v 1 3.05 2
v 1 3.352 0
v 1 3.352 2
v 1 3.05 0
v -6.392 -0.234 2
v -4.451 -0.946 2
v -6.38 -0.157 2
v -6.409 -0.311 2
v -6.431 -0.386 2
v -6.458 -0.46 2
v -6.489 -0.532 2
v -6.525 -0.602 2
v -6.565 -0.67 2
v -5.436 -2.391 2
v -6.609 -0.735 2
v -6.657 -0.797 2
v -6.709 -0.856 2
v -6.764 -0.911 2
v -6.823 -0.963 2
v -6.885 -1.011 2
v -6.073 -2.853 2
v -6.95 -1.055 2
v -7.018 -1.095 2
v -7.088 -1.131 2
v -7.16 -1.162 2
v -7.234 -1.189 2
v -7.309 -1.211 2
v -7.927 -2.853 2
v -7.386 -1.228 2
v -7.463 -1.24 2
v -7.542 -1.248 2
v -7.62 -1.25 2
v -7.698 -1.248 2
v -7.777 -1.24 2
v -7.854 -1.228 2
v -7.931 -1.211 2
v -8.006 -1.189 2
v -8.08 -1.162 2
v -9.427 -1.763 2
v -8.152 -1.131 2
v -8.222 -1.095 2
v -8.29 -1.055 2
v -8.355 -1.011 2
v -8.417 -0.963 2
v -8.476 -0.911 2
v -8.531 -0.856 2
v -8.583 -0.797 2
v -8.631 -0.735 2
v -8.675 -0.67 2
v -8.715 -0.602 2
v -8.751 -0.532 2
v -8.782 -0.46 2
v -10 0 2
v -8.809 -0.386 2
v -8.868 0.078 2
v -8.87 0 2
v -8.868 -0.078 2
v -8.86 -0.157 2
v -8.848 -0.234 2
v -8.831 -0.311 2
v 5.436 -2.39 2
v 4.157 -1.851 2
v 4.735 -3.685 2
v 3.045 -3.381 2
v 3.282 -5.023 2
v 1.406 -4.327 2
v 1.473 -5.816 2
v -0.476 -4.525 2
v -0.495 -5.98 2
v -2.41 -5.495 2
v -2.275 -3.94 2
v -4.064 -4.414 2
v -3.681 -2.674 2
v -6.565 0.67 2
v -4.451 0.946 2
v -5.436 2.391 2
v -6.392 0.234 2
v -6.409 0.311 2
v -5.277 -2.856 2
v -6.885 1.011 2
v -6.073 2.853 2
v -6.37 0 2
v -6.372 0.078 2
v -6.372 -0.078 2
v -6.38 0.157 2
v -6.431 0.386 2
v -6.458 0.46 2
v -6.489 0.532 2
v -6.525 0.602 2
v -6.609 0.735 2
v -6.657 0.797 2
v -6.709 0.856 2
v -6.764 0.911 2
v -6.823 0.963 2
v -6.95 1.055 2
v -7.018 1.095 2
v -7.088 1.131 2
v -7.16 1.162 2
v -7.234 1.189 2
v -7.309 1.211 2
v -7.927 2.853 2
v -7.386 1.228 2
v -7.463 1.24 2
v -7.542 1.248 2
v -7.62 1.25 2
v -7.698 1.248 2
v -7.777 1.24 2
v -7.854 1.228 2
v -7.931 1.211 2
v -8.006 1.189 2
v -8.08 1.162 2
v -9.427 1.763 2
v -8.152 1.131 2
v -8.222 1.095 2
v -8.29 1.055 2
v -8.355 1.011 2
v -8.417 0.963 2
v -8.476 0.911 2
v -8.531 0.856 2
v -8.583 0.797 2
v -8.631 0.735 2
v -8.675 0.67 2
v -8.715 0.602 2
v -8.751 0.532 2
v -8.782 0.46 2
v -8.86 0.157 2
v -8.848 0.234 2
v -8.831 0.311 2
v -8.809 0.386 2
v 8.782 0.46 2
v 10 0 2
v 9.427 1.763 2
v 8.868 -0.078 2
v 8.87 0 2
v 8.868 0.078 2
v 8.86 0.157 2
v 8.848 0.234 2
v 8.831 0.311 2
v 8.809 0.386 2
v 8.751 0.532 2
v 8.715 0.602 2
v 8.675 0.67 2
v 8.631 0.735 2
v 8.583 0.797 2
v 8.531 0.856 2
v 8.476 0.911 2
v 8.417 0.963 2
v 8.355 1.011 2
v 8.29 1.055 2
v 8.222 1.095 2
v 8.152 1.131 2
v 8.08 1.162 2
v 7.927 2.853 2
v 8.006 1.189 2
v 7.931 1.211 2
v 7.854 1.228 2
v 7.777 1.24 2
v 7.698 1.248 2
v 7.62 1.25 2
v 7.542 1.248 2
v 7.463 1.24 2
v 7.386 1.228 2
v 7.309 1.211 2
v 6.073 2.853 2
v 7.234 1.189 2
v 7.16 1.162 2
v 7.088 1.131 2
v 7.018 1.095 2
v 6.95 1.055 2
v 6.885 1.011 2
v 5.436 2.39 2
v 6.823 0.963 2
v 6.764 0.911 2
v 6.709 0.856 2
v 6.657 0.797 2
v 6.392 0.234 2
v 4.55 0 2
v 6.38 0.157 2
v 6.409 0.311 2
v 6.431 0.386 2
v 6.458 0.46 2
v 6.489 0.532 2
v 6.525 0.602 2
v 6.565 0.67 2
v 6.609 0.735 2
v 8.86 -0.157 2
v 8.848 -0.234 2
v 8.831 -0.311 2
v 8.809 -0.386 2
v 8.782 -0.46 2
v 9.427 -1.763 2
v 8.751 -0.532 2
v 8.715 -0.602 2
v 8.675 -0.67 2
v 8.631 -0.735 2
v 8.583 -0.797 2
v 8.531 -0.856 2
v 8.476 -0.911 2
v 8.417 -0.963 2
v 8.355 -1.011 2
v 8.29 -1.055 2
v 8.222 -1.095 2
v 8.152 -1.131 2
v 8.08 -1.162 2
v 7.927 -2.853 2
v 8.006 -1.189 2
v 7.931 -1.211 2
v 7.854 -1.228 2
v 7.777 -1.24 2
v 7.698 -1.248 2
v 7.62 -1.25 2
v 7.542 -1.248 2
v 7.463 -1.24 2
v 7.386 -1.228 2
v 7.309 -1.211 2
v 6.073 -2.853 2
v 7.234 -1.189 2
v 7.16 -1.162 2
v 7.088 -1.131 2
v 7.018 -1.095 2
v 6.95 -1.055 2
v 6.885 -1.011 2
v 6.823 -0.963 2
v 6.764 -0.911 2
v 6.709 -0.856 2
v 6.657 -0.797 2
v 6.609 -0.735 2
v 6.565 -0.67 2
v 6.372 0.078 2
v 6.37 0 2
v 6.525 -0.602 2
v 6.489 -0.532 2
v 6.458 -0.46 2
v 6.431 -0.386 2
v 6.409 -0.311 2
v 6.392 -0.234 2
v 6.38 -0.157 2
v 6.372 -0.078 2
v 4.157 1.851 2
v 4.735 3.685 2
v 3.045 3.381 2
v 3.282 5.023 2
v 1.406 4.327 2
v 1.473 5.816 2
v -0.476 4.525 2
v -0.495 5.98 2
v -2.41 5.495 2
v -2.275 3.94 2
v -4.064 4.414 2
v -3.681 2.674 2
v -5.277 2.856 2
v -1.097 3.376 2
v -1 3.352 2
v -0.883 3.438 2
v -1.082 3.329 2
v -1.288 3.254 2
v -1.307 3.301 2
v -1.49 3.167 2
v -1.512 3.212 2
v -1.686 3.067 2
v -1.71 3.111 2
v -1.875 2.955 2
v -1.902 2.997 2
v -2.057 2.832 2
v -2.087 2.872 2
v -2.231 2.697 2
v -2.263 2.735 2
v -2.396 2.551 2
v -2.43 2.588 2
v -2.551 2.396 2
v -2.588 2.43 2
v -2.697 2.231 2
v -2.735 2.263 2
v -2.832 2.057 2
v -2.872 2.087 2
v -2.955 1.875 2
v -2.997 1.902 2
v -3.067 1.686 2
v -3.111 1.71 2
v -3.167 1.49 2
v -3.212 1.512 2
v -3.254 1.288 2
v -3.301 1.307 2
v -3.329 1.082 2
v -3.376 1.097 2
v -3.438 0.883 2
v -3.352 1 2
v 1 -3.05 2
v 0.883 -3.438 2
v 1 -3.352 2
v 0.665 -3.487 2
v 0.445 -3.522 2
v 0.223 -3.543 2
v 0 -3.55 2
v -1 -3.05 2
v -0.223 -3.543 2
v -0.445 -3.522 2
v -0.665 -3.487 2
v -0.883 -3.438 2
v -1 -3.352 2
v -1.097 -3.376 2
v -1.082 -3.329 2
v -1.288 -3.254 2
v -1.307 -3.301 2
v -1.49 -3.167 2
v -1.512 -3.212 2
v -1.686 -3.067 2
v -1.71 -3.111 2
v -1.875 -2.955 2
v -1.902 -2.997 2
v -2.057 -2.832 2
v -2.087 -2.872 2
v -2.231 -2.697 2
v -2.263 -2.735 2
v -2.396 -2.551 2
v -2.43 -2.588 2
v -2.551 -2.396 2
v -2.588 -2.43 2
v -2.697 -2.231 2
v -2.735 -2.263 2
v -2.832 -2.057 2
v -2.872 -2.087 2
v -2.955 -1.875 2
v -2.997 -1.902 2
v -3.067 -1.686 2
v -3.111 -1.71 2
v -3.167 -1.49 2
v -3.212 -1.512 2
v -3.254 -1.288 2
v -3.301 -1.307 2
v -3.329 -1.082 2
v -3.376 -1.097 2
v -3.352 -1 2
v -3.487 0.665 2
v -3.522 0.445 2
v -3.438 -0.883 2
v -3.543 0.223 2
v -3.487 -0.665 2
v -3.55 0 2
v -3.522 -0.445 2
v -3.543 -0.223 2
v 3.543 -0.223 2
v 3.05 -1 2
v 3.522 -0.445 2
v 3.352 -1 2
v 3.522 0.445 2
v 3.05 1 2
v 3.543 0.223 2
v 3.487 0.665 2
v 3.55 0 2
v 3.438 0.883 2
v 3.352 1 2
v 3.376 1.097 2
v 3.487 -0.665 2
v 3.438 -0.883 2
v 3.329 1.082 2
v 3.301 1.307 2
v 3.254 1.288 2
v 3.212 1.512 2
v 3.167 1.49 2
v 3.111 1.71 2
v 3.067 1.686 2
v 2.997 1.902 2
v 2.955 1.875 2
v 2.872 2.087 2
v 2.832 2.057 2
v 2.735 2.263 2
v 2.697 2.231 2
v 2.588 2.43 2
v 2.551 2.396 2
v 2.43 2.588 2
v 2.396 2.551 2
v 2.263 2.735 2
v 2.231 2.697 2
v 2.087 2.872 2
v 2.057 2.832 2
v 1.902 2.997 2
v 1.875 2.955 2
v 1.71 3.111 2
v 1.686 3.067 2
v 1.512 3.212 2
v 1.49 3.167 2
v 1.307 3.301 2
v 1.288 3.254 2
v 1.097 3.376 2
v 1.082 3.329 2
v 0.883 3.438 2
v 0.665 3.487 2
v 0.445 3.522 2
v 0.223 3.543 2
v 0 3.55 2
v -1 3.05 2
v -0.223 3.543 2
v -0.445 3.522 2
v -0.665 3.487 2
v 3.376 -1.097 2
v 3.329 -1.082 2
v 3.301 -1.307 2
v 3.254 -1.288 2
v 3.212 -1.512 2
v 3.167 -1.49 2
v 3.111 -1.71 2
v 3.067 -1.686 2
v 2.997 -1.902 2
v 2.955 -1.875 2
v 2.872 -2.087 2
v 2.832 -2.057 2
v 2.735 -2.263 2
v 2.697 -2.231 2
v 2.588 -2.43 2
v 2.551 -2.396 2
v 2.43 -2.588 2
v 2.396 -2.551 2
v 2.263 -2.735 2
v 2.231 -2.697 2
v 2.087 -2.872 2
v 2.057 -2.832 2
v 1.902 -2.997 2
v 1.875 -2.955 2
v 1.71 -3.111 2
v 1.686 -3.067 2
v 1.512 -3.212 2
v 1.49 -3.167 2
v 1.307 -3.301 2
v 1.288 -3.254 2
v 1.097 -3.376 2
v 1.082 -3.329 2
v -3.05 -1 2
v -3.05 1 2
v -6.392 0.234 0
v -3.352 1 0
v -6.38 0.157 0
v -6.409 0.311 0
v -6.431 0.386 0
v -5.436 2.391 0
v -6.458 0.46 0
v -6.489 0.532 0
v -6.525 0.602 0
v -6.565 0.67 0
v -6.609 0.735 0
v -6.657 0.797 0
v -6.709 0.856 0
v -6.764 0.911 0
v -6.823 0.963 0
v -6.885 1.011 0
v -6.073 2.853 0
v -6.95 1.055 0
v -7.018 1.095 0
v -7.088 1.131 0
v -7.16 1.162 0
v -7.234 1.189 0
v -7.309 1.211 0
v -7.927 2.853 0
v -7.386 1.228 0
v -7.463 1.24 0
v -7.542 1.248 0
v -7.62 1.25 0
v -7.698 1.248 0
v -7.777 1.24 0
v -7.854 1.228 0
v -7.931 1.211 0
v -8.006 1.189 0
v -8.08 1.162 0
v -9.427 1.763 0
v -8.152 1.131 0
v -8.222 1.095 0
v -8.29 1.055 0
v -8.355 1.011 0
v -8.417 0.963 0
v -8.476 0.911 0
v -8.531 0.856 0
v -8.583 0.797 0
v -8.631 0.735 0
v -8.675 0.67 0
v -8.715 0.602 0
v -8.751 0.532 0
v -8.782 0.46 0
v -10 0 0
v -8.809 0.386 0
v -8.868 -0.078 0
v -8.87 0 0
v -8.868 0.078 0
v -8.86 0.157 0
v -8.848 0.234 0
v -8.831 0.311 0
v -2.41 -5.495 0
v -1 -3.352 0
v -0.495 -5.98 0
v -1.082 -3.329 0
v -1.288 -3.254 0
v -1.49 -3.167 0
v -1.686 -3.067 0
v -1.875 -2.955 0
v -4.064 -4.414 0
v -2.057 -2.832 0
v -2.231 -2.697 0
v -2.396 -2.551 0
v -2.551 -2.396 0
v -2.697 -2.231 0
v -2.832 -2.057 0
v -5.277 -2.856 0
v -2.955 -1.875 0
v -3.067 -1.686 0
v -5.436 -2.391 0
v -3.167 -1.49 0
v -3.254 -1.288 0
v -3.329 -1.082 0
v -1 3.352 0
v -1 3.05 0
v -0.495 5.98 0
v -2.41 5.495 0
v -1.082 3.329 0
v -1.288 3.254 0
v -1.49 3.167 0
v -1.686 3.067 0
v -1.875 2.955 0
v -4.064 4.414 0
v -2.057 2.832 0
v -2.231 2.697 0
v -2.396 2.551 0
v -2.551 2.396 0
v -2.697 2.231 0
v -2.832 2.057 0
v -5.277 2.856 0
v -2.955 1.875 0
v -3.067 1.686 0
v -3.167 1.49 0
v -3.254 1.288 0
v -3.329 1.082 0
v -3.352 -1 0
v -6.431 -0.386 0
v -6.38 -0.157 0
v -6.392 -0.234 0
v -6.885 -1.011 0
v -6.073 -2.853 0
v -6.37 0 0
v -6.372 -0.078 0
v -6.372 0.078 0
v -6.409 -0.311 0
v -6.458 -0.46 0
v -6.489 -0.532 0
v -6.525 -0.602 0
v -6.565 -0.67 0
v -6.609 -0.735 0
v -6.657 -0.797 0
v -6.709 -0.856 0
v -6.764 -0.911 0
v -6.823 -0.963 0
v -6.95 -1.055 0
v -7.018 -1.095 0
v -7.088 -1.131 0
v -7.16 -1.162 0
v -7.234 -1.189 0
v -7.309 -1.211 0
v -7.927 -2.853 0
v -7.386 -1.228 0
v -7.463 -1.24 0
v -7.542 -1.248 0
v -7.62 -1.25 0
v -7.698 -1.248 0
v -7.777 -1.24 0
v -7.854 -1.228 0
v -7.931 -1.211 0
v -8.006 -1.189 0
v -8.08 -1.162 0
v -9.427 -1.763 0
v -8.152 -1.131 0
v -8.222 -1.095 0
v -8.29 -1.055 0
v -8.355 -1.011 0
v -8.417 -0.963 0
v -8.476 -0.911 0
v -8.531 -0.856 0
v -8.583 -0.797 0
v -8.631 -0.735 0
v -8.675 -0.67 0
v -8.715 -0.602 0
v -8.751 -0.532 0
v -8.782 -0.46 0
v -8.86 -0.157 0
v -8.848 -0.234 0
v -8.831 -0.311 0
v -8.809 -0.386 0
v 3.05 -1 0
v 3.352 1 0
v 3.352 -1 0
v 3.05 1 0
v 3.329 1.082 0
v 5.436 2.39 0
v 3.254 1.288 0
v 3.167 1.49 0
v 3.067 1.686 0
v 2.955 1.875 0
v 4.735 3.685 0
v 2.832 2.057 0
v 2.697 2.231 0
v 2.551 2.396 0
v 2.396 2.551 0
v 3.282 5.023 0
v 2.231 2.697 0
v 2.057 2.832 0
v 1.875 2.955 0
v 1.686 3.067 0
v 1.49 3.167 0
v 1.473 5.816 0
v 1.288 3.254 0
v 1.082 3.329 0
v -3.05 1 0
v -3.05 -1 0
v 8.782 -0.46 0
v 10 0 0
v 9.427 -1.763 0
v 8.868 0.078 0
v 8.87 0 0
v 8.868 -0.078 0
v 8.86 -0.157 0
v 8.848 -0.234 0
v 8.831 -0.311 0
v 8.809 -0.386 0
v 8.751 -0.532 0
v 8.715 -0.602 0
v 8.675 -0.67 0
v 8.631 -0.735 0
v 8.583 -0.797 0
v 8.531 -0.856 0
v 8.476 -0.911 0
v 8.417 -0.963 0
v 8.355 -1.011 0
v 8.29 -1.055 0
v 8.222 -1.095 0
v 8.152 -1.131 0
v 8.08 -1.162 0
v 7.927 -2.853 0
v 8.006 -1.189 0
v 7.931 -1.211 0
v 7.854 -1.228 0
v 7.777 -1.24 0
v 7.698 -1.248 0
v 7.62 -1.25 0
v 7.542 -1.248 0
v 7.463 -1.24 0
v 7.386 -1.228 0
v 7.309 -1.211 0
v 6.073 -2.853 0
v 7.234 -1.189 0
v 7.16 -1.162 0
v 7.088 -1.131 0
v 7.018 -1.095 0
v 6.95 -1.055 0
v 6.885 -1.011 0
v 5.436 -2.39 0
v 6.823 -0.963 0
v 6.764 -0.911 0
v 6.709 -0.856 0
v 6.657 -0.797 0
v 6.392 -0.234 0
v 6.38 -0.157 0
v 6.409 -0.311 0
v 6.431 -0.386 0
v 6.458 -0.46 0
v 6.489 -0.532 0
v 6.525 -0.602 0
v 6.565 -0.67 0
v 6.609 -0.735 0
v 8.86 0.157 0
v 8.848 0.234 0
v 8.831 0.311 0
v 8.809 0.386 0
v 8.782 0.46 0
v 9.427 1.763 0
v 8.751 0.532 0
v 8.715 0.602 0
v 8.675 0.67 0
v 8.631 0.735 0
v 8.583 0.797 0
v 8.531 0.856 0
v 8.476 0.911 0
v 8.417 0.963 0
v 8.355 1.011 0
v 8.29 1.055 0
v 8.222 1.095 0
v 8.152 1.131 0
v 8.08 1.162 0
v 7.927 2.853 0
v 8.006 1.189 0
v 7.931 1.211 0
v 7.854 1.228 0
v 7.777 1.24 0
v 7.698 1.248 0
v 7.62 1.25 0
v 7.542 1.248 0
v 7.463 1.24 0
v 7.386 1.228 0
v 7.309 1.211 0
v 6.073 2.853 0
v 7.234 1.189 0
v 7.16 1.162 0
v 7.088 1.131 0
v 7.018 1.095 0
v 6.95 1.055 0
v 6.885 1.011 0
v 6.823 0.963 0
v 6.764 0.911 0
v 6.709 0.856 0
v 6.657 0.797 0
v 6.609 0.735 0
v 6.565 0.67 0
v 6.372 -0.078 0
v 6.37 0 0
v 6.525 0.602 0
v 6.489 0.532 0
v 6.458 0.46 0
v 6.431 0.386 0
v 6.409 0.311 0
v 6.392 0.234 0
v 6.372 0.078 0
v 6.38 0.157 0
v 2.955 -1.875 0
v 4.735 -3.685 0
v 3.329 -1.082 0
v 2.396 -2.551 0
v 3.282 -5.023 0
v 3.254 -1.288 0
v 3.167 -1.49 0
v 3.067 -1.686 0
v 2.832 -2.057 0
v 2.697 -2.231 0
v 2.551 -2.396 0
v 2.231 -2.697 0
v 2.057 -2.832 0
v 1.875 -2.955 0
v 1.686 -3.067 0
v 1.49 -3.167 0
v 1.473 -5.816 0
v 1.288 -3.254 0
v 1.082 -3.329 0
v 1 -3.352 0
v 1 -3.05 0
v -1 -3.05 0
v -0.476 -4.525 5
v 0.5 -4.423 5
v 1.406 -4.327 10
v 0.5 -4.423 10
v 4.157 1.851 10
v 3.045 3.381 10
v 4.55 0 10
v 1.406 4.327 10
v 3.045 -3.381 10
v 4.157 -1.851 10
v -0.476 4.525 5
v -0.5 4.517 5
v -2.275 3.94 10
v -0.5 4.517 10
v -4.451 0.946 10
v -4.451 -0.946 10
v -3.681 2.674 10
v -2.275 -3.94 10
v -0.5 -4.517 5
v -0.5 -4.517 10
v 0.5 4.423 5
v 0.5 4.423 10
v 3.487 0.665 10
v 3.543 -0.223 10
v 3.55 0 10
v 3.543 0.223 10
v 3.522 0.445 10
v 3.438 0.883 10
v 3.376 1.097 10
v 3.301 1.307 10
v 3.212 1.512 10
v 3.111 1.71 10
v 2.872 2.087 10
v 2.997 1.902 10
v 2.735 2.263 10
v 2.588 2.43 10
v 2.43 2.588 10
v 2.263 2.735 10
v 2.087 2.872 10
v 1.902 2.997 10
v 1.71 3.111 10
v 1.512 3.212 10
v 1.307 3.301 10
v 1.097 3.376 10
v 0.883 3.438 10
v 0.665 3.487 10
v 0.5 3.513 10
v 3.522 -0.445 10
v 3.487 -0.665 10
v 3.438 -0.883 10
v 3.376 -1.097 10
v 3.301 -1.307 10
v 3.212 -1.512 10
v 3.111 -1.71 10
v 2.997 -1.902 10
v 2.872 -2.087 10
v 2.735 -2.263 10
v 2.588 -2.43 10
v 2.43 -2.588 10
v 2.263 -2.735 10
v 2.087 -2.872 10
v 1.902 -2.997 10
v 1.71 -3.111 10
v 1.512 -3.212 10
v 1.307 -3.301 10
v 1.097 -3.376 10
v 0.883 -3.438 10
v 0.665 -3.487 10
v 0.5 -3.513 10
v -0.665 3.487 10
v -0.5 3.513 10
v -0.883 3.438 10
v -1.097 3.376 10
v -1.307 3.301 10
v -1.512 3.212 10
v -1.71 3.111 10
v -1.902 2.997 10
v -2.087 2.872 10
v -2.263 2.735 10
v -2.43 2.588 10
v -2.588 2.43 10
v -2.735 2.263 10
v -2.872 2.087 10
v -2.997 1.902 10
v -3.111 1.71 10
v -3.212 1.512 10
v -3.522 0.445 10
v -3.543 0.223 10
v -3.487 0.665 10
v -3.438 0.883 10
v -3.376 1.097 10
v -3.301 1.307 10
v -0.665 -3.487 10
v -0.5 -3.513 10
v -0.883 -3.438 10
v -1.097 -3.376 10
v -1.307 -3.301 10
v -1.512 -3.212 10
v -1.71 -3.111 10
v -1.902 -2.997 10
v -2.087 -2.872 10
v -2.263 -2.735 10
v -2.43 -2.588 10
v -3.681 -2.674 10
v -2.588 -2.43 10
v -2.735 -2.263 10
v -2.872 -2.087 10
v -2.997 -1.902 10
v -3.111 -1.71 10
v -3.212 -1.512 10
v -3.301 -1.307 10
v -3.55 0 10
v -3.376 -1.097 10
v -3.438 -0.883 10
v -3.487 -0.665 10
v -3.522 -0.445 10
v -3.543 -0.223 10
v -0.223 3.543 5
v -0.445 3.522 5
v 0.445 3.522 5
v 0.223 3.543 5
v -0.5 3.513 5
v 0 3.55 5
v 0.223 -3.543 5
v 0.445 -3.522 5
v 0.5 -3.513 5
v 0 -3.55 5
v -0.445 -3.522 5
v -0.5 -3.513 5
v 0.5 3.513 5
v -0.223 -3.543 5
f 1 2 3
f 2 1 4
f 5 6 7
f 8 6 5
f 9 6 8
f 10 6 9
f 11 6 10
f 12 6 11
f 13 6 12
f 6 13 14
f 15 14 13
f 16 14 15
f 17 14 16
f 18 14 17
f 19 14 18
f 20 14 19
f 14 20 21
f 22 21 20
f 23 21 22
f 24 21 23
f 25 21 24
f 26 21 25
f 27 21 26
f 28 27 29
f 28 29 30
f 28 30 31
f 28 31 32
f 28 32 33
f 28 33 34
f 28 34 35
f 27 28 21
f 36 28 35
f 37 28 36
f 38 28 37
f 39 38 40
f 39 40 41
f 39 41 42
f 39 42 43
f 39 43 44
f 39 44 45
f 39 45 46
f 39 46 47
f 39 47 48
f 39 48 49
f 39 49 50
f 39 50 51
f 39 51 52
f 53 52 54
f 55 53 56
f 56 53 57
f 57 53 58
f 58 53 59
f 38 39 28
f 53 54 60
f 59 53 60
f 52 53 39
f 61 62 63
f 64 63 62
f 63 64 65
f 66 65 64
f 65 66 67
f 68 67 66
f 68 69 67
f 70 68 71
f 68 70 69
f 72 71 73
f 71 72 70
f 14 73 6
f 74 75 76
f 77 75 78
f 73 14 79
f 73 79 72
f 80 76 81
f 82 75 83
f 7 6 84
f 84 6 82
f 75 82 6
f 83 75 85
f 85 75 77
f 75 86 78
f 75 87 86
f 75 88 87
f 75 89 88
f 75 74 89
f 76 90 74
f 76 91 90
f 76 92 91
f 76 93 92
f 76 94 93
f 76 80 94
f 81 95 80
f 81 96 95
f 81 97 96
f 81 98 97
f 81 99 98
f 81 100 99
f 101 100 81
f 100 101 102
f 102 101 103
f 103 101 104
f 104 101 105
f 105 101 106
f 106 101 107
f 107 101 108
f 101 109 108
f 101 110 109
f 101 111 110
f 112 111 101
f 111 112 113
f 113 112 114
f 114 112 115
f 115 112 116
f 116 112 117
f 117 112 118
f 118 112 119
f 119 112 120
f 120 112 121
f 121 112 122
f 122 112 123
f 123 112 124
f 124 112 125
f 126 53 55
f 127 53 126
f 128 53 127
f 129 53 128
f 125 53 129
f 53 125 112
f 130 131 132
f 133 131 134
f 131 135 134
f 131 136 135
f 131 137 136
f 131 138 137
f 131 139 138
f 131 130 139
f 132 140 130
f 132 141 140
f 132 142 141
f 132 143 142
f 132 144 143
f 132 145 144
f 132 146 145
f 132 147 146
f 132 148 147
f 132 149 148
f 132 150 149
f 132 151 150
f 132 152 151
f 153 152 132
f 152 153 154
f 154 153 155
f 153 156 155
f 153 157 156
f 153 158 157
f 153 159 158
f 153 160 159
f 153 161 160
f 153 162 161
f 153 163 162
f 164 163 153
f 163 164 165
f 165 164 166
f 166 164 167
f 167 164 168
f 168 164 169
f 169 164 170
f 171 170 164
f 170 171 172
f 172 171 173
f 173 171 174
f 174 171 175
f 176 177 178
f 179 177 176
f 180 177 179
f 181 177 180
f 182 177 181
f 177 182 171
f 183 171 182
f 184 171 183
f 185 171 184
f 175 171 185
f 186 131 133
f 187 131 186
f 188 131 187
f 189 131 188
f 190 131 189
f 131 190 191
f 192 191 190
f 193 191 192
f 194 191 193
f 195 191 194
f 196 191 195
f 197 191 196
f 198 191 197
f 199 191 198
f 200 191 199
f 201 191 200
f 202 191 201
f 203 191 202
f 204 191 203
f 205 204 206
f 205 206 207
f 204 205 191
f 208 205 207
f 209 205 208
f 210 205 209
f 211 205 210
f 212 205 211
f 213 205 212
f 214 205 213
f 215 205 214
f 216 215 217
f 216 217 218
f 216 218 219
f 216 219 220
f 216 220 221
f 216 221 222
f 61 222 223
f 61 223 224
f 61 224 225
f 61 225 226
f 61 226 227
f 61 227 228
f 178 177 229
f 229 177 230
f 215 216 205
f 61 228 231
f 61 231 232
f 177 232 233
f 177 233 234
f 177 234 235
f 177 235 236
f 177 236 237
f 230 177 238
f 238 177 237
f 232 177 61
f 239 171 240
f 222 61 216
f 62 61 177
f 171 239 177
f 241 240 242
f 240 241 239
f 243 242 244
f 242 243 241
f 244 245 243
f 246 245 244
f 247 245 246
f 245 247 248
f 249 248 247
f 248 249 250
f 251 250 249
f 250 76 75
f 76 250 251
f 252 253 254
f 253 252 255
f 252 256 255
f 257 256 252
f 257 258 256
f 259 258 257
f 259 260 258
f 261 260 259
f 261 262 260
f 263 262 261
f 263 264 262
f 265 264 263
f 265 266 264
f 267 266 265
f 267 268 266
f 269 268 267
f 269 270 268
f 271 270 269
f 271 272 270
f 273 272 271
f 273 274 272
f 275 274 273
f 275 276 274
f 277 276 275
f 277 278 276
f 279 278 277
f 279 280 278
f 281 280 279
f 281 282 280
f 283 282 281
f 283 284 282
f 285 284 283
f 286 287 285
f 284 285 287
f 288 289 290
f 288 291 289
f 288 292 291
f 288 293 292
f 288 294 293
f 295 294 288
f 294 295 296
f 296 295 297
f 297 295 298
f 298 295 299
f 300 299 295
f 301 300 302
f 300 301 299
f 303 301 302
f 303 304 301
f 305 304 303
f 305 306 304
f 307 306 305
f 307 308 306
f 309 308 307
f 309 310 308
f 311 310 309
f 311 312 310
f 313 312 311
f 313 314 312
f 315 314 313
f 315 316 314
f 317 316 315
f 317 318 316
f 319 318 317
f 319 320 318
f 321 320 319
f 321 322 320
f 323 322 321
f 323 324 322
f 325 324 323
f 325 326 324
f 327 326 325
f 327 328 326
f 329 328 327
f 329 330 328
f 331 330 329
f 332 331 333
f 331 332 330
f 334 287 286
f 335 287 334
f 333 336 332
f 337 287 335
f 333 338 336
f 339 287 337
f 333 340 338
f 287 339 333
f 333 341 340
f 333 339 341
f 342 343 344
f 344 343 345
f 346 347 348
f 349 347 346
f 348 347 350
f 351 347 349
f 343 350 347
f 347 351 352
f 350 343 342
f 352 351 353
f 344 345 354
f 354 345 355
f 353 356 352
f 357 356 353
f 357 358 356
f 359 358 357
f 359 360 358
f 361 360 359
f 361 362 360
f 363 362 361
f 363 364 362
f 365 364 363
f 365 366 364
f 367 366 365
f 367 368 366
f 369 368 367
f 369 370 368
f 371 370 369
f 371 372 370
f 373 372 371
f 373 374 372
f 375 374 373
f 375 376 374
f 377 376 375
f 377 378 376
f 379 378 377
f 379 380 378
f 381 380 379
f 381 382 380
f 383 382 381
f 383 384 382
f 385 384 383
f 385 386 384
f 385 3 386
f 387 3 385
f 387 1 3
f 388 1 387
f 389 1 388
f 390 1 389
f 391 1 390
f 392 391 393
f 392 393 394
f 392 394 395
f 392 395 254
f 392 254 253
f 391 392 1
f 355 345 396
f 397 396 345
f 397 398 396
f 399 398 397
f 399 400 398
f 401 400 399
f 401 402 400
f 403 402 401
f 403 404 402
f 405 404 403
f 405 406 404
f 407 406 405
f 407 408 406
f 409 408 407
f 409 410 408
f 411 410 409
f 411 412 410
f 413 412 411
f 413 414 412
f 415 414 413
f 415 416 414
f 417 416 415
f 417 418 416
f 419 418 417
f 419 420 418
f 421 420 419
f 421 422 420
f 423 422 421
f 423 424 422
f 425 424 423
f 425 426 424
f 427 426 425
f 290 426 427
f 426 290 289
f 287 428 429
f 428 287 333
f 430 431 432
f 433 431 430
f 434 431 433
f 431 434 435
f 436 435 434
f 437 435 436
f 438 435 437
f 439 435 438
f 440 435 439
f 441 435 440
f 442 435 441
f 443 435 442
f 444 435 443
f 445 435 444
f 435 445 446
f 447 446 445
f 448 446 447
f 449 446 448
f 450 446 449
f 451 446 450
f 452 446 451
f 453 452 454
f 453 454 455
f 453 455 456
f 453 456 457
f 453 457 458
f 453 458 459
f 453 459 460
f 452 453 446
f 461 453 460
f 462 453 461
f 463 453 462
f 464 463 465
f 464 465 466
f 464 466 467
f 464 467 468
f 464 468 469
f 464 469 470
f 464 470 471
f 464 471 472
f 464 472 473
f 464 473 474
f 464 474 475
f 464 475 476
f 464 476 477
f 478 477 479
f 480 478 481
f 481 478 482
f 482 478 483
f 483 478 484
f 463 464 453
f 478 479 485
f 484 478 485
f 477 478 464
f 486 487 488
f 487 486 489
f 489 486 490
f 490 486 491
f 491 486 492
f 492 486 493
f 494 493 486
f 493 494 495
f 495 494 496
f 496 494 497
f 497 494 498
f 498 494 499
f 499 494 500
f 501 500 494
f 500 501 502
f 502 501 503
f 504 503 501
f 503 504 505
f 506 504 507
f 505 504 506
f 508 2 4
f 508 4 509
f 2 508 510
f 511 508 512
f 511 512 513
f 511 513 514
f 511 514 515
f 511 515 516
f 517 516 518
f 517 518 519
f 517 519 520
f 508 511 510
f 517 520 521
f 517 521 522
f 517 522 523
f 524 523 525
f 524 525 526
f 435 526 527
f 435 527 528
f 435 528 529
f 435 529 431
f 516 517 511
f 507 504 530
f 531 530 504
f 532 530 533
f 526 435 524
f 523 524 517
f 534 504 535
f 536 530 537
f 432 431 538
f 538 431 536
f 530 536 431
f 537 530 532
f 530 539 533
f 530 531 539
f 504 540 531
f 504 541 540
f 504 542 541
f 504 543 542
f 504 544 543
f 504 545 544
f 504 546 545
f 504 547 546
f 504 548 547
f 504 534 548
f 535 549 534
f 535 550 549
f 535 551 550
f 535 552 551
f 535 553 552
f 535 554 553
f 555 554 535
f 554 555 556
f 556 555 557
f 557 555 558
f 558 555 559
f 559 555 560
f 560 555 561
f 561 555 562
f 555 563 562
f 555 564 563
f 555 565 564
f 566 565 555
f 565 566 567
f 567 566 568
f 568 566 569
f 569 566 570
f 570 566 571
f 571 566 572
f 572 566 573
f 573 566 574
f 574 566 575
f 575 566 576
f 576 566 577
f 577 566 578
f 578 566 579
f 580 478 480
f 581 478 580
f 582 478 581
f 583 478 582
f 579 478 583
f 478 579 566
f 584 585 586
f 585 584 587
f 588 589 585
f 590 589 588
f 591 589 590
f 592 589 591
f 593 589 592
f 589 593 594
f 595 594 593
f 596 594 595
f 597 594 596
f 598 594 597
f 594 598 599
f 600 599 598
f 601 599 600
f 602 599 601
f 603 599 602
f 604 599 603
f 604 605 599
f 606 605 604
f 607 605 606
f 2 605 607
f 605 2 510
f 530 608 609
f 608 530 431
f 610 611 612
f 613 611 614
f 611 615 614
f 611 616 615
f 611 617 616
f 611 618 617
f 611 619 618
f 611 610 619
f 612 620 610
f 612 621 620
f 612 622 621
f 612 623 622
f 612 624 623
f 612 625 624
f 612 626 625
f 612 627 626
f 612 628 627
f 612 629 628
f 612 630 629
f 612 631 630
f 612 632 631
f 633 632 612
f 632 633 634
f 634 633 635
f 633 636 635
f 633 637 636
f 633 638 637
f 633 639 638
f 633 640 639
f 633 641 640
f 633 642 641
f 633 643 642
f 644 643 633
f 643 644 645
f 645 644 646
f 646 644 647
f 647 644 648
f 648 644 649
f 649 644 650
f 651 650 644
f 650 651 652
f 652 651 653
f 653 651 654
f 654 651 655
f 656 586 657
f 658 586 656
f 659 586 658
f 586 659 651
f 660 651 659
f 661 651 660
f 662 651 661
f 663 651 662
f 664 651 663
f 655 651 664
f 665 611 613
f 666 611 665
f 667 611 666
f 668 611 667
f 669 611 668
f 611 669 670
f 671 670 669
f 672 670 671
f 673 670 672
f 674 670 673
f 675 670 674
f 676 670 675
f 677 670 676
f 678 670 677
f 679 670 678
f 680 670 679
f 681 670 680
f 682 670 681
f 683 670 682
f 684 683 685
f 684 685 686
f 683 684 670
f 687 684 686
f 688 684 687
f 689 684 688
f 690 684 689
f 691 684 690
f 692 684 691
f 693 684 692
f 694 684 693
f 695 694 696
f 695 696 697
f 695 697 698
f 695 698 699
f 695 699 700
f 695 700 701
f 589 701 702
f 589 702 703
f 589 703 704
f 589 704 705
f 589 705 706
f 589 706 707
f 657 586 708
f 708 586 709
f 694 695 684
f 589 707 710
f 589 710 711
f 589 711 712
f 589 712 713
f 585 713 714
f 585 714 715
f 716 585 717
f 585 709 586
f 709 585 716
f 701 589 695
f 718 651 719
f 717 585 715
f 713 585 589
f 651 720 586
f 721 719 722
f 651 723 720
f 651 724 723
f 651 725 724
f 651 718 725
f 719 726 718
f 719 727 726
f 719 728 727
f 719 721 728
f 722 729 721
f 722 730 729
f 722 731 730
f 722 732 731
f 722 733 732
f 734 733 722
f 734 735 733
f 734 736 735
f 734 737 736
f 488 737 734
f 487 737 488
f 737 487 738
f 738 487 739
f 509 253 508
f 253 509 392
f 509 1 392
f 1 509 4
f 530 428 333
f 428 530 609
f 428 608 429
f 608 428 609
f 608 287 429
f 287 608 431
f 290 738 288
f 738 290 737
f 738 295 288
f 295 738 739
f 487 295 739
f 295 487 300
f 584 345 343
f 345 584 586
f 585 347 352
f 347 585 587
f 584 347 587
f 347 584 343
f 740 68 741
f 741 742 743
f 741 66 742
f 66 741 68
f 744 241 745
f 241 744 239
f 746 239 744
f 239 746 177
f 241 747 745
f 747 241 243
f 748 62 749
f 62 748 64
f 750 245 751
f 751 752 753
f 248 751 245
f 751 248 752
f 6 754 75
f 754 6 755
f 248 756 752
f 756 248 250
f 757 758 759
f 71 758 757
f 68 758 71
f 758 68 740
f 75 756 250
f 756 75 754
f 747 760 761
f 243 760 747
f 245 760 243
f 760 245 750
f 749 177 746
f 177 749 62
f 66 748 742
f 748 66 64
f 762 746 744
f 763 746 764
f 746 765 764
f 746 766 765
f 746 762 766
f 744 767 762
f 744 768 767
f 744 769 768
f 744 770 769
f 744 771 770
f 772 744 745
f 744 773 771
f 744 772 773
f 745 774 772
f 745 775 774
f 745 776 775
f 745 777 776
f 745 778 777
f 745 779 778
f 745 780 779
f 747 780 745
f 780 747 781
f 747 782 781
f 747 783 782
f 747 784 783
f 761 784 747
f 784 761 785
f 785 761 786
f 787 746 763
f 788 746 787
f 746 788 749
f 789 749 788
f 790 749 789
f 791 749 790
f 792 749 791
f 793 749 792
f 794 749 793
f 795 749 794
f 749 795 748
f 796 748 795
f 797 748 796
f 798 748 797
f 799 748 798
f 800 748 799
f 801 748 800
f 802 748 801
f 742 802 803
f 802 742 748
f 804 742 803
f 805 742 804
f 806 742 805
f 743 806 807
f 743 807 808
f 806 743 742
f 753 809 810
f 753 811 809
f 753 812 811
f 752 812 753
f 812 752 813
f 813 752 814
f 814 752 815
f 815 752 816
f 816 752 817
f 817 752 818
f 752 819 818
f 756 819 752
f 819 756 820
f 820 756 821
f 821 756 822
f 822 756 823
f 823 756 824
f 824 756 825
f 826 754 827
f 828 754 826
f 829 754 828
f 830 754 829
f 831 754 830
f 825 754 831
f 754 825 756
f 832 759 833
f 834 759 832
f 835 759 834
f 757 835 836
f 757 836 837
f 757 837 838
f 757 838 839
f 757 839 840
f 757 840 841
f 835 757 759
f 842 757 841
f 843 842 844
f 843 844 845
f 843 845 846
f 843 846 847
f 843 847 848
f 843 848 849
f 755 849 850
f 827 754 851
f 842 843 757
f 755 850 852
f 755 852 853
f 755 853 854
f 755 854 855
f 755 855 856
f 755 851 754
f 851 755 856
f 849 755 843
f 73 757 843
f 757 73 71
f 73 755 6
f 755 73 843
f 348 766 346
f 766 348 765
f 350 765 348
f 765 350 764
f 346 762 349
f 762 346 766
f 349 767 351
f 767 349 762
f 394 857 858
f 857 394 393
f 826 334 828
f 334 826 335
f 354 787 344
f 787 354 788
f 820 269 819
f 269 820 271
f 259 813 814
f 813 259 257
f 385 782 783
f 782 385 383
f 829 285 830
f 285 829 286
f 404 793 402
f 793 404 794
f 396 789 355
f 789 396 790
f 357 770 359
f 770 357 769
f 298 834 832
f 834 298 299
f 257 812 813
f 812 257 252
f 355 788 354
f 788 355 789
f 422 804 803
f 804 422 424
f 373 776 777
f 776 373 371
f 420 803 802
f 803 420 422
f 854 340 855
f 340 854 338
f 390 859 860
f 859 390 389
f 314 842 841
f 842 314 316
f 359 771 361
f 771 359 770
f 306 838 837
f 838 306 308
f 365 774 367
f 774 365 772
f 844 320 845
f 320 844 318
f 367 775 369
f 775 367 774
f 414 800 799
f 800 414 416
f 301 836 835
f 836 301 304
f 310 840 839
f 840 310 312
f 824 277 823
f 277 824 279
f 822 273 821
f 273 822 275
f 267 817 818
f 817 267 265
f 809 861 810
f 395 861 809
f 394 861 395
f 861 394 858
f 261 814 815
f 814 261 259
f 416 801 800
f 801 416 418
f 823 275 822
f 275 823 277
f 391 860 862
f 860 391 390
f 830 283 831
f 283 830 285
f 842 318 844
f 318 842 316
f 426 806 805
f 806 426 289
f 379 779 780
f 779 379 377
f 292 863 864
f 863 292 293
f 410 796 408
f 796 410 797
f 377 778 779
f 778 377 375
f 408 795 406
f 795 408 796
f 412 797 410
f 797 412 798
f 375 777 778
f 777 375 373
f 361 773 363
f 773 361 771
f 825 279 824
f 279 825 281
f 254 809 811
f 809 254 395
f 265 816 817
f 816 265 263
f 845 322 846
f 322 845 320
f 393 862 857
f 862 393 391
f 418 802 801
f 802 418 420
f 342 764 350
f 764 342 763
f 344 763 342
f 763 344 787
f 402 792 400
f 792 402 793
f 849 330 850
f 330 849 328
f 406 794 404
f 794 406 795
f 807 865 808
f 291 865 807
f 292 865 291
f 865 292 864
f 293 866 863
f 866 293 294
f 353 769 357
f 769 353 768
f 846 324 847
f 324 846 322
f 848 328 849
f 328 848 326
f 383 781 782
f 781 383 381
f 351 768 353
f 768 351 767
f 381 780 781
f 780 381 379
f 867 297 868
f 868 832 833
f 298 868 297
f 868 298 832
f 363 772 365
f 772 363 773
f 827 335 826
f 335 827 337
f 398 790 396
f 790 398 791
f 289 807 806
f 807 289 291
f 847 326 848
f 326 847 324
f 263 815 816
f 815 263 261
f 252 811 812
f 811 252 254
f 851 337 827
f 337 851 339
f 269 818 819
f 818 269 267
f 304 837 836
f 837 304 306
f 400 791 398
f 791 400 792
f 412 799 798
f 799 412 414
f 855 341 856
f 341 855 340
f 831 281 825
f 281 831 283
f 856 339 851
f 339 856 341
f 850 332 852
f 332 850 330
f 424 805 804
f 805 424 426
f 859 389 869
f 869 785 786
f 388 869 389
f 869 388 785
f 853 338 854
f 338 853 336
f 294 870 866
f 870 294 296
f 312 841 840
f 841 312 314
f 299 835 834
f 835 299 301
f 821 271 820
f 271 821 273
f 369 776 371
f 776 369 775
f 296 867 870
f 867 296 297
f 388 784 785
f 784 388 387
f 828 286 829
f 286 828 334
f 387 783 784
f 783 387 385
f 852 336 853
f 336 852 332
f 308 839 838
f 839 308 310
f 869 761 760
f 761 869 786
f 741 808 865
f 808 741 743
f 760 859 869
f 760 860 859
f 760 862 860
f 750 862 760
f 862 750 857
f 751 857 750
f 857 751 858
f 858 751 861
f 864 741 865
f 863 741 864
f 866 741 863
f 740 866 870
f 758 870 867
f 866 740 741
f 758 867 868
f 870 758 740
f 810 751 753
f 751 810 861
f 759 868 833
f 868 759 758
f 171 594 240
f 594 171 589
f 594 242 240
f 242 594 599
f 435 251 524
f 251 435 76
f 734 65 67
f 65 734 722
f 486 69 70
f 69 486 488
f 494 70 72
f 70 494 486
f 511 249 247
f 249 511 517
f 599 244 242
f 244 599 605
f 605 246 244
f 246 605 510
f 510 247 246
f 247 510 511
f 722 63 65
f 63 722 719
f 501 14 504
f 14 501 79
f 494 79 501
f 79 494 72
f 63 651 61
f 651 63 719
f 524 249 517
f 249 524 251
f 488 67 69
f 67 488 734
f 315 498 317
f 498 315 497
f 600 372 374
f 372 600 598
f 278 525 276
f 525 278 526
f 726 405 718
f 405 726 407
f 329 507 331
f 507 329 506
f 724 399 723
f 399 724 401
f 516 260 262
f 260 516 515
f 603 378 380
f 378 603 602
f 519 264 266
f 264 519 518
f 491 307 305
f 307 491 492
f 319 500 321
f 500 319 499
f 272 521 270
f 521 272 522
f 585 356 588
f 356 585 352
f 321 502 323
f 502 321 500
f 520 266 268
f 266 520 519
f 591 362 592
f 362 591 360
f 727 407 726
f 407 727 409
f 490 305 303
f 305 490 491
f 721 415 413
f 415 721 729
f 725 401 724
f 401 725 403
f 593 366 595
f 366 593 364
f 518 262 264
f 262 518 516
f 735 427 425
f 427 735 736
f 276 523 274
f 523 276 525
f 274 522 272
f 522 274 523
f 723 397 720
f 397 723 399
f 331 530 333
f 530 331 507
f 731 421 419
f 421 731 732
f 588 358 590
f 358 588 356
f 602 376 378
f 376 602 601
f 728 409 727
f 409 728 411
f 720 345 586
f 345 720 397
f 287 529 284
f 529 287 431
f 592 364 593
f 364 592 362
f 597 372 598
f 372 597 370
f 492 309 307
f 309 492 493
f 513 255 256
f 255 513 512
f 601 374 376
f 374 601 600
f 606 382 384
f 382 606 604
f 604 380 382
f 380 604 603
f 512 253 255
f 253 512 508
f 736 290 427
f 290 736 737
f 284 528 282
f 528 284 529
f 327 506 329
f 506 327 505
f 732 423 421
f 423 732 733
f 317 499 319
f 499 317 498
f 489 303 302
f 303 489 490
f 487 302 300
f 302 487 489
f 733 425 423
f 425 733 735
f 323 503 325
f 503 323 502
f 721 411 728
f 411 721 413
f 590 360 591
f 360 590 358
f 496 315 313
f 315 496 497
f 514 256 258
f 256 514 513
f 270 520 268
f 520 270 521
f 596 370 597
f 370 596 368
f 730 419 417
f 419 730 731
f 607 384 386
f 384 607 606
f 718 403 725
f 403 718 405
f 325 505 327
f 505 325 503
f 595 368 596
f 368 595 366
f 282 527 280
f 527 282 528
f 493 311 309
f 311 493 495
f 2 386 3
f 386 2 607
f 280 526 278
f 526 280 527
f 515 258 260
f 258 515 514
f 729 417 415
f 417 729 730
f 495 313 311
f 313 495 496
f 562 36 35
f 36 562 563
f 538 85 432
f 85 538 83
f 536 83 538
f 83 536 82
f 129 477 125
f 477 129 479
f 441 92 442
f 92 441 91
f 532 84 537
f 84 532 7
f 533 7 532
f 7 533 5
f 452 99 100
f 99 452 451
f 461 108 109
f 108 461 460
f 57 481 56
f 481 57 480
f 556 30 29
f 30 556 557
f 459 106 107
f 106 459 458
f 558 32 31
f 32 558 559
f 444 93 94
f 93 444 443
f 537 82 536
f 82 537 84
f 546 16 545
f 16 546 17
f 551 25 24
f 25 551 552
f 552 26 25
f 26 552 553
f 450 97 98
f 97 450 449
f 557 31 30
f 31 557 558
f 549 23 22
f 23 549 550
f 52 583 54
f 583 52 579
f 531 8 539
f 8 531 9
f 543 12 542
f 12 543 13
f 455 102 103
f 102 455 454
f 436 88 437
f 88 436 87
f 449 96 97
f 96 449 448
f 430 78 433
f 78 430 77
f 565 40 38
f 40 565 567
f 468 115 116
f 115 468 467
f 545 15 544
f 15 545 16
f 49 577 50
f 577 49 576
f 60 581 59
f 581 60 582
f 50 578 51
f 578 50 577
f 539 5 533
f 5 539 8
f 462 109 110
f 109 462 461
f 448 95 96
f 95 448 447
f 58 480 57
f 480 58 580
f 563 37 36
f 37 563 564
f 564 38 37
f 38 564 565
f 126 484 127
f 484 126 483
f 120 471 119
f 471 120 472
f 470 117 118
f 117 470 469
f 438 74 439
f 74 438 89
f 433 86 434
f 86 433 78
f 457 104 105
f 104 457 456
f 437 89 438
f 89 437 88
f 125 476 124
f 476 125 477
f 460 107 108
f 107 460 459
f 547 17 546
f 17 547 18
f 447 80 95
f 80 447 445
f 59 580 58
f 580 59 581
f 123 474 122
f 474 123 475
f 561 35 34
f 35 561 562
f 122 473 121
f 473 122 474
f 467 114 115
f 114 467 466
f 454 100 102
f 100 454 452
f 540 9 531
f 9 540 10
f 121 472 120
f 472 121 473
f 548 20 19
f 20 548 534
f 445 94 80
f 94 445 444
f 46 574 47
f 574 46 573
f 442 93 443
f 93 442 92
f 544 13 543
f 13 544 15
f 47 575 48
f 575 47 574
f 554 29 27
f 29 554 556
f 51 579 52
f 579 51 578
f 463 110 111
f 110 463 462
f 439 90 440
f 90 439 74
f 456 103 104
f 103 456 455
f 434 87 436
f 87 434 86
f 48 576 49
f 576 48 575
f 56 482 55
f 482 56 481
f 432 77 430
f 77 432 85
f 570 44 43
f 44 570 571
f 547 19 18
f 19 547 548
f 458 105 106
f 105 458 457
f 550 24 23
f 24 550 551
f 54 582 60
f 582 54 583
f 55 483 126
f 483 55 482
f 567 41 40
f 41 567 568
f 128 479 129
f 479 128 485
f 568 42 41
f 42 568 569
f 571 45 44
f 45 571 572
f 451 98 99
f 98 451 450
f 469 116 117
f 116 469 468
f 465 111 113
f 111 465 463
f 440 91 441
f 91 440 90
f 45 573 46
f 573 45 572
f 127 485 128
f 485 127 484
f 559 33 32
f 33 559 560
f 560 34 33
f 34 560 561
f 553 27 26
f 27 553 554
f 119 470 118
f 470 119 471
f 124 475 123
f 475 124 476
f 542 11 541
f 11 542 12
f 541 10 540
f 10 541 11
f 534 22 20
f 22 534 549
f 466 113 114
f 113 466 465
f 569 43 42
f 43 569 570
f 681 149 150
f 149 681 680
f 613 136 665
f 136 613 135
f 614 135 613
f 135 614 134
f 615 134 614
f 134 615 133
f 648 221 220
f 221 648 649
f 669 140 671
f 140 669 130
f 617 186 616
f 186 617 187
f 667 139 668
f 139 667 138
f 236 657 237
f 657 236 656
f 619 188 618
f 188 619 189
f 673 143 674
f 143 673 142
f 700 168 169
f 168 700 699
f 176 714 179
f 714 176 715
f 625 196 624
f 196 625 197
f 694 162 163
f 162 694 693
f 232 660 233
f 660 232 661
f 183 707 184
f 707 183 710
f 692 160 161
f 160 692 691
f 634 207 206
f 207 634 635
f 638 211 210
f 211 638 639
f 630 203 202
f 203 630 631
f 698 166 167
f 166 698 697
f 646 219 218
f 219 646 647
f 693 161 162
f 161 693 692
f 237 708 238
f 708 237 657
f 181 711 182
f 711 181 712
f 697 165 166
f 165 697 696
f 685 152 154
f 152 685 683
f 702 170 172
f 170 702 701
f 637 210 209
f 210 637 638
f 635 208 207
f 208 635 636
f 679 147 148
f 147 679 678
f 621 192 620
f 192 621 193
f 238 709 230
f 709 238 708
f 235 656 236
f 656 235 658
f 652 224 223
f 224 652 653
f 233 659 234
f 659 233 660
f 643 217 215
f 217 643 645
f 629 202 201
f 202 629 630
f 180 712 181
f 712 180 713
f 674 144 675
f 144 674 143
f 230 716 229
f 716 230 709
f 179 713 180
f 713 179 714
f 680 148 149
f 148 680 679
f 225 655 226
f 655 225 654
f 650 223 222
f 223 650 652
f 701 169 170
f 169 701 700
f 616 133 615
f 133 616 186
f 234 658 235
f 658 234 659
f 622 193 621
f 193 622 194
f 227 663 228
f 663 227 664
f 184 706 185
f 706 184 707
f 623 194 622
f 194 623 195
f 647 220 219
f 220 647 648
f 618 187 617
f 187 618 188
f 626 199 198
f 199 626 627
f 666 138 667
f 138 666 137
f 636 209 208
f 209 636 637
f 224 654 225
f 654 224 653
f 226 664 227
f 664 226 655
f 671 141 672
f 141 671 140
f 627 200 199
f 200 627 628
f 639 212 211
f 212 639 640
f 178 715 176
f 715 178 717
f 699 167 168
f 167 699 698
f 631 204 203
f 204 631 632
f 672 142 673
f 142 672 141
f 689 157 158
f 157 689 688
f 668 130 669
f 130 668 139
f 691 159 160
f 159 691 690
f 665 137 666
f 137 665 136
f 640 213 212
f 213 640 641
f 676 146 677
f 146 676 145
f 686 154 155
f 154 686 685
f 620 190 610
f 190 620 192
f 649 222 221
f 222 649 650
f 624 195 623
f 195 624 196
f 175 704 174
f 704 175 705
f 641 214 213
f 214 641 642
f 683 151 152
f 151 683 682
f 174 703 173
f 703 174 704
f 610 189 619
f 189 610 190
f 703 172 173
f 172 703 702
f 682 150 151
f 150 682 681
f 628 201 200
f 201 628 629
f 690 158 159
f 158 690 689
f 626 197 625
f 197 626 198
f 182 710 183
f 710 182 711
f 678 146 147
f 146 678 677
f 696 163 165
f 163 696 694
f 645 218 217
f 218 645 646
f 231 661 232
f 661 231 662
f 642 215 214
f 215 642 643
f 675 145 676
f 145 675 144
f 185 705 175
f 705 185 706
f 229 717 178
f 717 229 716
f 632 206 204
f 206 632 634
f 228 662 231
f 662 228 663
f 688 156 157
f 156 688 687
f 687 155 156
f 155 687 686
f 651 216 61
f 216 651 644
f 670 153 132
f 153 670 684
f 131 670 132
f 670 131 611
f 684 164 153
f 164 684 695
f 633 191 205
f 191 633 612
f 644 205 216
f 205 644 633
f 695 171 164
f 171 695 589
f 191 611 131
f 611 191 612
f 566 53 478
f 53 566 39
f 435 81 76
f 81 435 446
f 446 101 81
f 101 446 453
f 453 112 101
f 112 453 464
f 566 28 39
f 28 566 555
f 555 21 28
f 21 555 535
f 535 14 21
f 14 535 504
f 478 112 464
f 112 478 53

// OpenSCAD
//By http://www.thingiverse.com/Paintballmagic



motor_size = 7.0;
motor_hole_modifier_percentage = 1.0;
wall_thickness = 1.0;  
base_height = 2.0;  
support_hole = 7.0;  
tower_height = 10.0;  
tower_support_diameter = 12.0;
groove_size = 8.65;
tower_grove_height = 0.0;  
screw_holes_diameter = 2.5;  
screw_base_diameter = 4.0;
screw_base_height = 2.0;  
screw_support_base_width = 6.0; 
screw_holes_radius = 7.62;  
screw_holes_connector_radius =7.0;
notch = 1; // [0,1]
notch_depth=5;
pillars = 4;
pillar_height = 2.0;
pillar_width = 2.0;
pillar_length = 2.0; 
pillar_inset = 0.5;
pillar_z_offset = 0.0;

// No need to modify below this line. Anything adjustable is listed in the aboveglobal veriables.

module example001()
{

for ( i = [0 : pillars-1] )
{

  rotate(a= i* 360/pillars, v=[0,0,1]) 
translate([0,motor_size/2+pillar_length/2-pillar_inset,pillar_height/2+pillar_z_offset ])
cube(size = [pillar_length,pillar_width,pillar_height], center = true);
}


motor_size = motor_size +(motor_hole_modifier_percentage*.1);
if (notch == 0){
difference() {
cylinder(h = tower_height, r=motor_size/2+ wall_thickness );     
cylinder (h = tower_height*4, r=motor_size/2, center = true, $fn=100);

}
}
if (notch == 1){

difference() {
translate([0,0,base_height + tower_grove_height ])
cylinder(h = tower_height -(base_height + tower_grove_height), r=motor_size/2+ wall_thickness  );     
cylinder (h = tower_height*4, r=motor_size/2, center = true, $fn=100);
translate([0,0,tower_height-notch_depth + (tower_height/2)])
cube(size = [1,20,tower_height], center = true);

}

}




difference() {
cylinder(h = base_height, r=tower_support_diameter/2);   
cylinder (h = tower_height, r=support_hole/2, center = true, $fn=100);
} 

if(tower_grove_height > 0 )
{
difference() {
translate([0,0,base_height + tower_grove_height ])
cylinder(h = base_height, r=tower_support_diameter/2);   
cylinder (h = tower_height, r=motor_size/2, center = true, $fn=100);
} 
}

difference() {
translate([-screw_holes_radius,0,0]) 
cylinder(h = base_height, r=screw_base_diameter/2);
translate([-screw_holes_radius,0,0]) cylinder(h = tower_height, r=screw_holes_diameter/2, center = true, $fn=100);

}

difference() {
translate([screw_holes_radius,0,0]) 
cylinder(h = base_height, r=screw_base_diameter/2);
translate([screw_holes_radius,0,0]) cylinder(h = tower_height, r=screw_holes_diameter/2, center = true, $fn=100);

}

difference() {
translate([screw_holes_connector_radius,0,0]) 
cylinder(h = screw_base_height, r=screw_support_base_width/2);
translate([screw_holes_radius,0,0]) cylinder(h = tower_height, r=screw_holes_diameter/2, center = true, $fn=100);

}

difference() {
translate([-screw_holes_connector_radius,0,0]) 
cylinder(h = screw_base_height, r=screw_support_base_width/2);
translate([-screw_holes_radius,0,0]) cylinder(h = tower_height, r=screw_holes_diameter/2, center = true, $fn=100);

}


difference() {
translate([0,0,base_height ])
cylinder(h = tower_grove_height, r=groove_size/2);
   
cylinder (h = tower_height+1, r=motor_size/2, center = true, $fn=100);
} 

}

example001();

string = motor_size +(motor_hole_modifier_percentage*.1);
echo ("<p> Actual part inner diameter" ,string , "<br><br> Motor diameter", motor_size , "</p>");
